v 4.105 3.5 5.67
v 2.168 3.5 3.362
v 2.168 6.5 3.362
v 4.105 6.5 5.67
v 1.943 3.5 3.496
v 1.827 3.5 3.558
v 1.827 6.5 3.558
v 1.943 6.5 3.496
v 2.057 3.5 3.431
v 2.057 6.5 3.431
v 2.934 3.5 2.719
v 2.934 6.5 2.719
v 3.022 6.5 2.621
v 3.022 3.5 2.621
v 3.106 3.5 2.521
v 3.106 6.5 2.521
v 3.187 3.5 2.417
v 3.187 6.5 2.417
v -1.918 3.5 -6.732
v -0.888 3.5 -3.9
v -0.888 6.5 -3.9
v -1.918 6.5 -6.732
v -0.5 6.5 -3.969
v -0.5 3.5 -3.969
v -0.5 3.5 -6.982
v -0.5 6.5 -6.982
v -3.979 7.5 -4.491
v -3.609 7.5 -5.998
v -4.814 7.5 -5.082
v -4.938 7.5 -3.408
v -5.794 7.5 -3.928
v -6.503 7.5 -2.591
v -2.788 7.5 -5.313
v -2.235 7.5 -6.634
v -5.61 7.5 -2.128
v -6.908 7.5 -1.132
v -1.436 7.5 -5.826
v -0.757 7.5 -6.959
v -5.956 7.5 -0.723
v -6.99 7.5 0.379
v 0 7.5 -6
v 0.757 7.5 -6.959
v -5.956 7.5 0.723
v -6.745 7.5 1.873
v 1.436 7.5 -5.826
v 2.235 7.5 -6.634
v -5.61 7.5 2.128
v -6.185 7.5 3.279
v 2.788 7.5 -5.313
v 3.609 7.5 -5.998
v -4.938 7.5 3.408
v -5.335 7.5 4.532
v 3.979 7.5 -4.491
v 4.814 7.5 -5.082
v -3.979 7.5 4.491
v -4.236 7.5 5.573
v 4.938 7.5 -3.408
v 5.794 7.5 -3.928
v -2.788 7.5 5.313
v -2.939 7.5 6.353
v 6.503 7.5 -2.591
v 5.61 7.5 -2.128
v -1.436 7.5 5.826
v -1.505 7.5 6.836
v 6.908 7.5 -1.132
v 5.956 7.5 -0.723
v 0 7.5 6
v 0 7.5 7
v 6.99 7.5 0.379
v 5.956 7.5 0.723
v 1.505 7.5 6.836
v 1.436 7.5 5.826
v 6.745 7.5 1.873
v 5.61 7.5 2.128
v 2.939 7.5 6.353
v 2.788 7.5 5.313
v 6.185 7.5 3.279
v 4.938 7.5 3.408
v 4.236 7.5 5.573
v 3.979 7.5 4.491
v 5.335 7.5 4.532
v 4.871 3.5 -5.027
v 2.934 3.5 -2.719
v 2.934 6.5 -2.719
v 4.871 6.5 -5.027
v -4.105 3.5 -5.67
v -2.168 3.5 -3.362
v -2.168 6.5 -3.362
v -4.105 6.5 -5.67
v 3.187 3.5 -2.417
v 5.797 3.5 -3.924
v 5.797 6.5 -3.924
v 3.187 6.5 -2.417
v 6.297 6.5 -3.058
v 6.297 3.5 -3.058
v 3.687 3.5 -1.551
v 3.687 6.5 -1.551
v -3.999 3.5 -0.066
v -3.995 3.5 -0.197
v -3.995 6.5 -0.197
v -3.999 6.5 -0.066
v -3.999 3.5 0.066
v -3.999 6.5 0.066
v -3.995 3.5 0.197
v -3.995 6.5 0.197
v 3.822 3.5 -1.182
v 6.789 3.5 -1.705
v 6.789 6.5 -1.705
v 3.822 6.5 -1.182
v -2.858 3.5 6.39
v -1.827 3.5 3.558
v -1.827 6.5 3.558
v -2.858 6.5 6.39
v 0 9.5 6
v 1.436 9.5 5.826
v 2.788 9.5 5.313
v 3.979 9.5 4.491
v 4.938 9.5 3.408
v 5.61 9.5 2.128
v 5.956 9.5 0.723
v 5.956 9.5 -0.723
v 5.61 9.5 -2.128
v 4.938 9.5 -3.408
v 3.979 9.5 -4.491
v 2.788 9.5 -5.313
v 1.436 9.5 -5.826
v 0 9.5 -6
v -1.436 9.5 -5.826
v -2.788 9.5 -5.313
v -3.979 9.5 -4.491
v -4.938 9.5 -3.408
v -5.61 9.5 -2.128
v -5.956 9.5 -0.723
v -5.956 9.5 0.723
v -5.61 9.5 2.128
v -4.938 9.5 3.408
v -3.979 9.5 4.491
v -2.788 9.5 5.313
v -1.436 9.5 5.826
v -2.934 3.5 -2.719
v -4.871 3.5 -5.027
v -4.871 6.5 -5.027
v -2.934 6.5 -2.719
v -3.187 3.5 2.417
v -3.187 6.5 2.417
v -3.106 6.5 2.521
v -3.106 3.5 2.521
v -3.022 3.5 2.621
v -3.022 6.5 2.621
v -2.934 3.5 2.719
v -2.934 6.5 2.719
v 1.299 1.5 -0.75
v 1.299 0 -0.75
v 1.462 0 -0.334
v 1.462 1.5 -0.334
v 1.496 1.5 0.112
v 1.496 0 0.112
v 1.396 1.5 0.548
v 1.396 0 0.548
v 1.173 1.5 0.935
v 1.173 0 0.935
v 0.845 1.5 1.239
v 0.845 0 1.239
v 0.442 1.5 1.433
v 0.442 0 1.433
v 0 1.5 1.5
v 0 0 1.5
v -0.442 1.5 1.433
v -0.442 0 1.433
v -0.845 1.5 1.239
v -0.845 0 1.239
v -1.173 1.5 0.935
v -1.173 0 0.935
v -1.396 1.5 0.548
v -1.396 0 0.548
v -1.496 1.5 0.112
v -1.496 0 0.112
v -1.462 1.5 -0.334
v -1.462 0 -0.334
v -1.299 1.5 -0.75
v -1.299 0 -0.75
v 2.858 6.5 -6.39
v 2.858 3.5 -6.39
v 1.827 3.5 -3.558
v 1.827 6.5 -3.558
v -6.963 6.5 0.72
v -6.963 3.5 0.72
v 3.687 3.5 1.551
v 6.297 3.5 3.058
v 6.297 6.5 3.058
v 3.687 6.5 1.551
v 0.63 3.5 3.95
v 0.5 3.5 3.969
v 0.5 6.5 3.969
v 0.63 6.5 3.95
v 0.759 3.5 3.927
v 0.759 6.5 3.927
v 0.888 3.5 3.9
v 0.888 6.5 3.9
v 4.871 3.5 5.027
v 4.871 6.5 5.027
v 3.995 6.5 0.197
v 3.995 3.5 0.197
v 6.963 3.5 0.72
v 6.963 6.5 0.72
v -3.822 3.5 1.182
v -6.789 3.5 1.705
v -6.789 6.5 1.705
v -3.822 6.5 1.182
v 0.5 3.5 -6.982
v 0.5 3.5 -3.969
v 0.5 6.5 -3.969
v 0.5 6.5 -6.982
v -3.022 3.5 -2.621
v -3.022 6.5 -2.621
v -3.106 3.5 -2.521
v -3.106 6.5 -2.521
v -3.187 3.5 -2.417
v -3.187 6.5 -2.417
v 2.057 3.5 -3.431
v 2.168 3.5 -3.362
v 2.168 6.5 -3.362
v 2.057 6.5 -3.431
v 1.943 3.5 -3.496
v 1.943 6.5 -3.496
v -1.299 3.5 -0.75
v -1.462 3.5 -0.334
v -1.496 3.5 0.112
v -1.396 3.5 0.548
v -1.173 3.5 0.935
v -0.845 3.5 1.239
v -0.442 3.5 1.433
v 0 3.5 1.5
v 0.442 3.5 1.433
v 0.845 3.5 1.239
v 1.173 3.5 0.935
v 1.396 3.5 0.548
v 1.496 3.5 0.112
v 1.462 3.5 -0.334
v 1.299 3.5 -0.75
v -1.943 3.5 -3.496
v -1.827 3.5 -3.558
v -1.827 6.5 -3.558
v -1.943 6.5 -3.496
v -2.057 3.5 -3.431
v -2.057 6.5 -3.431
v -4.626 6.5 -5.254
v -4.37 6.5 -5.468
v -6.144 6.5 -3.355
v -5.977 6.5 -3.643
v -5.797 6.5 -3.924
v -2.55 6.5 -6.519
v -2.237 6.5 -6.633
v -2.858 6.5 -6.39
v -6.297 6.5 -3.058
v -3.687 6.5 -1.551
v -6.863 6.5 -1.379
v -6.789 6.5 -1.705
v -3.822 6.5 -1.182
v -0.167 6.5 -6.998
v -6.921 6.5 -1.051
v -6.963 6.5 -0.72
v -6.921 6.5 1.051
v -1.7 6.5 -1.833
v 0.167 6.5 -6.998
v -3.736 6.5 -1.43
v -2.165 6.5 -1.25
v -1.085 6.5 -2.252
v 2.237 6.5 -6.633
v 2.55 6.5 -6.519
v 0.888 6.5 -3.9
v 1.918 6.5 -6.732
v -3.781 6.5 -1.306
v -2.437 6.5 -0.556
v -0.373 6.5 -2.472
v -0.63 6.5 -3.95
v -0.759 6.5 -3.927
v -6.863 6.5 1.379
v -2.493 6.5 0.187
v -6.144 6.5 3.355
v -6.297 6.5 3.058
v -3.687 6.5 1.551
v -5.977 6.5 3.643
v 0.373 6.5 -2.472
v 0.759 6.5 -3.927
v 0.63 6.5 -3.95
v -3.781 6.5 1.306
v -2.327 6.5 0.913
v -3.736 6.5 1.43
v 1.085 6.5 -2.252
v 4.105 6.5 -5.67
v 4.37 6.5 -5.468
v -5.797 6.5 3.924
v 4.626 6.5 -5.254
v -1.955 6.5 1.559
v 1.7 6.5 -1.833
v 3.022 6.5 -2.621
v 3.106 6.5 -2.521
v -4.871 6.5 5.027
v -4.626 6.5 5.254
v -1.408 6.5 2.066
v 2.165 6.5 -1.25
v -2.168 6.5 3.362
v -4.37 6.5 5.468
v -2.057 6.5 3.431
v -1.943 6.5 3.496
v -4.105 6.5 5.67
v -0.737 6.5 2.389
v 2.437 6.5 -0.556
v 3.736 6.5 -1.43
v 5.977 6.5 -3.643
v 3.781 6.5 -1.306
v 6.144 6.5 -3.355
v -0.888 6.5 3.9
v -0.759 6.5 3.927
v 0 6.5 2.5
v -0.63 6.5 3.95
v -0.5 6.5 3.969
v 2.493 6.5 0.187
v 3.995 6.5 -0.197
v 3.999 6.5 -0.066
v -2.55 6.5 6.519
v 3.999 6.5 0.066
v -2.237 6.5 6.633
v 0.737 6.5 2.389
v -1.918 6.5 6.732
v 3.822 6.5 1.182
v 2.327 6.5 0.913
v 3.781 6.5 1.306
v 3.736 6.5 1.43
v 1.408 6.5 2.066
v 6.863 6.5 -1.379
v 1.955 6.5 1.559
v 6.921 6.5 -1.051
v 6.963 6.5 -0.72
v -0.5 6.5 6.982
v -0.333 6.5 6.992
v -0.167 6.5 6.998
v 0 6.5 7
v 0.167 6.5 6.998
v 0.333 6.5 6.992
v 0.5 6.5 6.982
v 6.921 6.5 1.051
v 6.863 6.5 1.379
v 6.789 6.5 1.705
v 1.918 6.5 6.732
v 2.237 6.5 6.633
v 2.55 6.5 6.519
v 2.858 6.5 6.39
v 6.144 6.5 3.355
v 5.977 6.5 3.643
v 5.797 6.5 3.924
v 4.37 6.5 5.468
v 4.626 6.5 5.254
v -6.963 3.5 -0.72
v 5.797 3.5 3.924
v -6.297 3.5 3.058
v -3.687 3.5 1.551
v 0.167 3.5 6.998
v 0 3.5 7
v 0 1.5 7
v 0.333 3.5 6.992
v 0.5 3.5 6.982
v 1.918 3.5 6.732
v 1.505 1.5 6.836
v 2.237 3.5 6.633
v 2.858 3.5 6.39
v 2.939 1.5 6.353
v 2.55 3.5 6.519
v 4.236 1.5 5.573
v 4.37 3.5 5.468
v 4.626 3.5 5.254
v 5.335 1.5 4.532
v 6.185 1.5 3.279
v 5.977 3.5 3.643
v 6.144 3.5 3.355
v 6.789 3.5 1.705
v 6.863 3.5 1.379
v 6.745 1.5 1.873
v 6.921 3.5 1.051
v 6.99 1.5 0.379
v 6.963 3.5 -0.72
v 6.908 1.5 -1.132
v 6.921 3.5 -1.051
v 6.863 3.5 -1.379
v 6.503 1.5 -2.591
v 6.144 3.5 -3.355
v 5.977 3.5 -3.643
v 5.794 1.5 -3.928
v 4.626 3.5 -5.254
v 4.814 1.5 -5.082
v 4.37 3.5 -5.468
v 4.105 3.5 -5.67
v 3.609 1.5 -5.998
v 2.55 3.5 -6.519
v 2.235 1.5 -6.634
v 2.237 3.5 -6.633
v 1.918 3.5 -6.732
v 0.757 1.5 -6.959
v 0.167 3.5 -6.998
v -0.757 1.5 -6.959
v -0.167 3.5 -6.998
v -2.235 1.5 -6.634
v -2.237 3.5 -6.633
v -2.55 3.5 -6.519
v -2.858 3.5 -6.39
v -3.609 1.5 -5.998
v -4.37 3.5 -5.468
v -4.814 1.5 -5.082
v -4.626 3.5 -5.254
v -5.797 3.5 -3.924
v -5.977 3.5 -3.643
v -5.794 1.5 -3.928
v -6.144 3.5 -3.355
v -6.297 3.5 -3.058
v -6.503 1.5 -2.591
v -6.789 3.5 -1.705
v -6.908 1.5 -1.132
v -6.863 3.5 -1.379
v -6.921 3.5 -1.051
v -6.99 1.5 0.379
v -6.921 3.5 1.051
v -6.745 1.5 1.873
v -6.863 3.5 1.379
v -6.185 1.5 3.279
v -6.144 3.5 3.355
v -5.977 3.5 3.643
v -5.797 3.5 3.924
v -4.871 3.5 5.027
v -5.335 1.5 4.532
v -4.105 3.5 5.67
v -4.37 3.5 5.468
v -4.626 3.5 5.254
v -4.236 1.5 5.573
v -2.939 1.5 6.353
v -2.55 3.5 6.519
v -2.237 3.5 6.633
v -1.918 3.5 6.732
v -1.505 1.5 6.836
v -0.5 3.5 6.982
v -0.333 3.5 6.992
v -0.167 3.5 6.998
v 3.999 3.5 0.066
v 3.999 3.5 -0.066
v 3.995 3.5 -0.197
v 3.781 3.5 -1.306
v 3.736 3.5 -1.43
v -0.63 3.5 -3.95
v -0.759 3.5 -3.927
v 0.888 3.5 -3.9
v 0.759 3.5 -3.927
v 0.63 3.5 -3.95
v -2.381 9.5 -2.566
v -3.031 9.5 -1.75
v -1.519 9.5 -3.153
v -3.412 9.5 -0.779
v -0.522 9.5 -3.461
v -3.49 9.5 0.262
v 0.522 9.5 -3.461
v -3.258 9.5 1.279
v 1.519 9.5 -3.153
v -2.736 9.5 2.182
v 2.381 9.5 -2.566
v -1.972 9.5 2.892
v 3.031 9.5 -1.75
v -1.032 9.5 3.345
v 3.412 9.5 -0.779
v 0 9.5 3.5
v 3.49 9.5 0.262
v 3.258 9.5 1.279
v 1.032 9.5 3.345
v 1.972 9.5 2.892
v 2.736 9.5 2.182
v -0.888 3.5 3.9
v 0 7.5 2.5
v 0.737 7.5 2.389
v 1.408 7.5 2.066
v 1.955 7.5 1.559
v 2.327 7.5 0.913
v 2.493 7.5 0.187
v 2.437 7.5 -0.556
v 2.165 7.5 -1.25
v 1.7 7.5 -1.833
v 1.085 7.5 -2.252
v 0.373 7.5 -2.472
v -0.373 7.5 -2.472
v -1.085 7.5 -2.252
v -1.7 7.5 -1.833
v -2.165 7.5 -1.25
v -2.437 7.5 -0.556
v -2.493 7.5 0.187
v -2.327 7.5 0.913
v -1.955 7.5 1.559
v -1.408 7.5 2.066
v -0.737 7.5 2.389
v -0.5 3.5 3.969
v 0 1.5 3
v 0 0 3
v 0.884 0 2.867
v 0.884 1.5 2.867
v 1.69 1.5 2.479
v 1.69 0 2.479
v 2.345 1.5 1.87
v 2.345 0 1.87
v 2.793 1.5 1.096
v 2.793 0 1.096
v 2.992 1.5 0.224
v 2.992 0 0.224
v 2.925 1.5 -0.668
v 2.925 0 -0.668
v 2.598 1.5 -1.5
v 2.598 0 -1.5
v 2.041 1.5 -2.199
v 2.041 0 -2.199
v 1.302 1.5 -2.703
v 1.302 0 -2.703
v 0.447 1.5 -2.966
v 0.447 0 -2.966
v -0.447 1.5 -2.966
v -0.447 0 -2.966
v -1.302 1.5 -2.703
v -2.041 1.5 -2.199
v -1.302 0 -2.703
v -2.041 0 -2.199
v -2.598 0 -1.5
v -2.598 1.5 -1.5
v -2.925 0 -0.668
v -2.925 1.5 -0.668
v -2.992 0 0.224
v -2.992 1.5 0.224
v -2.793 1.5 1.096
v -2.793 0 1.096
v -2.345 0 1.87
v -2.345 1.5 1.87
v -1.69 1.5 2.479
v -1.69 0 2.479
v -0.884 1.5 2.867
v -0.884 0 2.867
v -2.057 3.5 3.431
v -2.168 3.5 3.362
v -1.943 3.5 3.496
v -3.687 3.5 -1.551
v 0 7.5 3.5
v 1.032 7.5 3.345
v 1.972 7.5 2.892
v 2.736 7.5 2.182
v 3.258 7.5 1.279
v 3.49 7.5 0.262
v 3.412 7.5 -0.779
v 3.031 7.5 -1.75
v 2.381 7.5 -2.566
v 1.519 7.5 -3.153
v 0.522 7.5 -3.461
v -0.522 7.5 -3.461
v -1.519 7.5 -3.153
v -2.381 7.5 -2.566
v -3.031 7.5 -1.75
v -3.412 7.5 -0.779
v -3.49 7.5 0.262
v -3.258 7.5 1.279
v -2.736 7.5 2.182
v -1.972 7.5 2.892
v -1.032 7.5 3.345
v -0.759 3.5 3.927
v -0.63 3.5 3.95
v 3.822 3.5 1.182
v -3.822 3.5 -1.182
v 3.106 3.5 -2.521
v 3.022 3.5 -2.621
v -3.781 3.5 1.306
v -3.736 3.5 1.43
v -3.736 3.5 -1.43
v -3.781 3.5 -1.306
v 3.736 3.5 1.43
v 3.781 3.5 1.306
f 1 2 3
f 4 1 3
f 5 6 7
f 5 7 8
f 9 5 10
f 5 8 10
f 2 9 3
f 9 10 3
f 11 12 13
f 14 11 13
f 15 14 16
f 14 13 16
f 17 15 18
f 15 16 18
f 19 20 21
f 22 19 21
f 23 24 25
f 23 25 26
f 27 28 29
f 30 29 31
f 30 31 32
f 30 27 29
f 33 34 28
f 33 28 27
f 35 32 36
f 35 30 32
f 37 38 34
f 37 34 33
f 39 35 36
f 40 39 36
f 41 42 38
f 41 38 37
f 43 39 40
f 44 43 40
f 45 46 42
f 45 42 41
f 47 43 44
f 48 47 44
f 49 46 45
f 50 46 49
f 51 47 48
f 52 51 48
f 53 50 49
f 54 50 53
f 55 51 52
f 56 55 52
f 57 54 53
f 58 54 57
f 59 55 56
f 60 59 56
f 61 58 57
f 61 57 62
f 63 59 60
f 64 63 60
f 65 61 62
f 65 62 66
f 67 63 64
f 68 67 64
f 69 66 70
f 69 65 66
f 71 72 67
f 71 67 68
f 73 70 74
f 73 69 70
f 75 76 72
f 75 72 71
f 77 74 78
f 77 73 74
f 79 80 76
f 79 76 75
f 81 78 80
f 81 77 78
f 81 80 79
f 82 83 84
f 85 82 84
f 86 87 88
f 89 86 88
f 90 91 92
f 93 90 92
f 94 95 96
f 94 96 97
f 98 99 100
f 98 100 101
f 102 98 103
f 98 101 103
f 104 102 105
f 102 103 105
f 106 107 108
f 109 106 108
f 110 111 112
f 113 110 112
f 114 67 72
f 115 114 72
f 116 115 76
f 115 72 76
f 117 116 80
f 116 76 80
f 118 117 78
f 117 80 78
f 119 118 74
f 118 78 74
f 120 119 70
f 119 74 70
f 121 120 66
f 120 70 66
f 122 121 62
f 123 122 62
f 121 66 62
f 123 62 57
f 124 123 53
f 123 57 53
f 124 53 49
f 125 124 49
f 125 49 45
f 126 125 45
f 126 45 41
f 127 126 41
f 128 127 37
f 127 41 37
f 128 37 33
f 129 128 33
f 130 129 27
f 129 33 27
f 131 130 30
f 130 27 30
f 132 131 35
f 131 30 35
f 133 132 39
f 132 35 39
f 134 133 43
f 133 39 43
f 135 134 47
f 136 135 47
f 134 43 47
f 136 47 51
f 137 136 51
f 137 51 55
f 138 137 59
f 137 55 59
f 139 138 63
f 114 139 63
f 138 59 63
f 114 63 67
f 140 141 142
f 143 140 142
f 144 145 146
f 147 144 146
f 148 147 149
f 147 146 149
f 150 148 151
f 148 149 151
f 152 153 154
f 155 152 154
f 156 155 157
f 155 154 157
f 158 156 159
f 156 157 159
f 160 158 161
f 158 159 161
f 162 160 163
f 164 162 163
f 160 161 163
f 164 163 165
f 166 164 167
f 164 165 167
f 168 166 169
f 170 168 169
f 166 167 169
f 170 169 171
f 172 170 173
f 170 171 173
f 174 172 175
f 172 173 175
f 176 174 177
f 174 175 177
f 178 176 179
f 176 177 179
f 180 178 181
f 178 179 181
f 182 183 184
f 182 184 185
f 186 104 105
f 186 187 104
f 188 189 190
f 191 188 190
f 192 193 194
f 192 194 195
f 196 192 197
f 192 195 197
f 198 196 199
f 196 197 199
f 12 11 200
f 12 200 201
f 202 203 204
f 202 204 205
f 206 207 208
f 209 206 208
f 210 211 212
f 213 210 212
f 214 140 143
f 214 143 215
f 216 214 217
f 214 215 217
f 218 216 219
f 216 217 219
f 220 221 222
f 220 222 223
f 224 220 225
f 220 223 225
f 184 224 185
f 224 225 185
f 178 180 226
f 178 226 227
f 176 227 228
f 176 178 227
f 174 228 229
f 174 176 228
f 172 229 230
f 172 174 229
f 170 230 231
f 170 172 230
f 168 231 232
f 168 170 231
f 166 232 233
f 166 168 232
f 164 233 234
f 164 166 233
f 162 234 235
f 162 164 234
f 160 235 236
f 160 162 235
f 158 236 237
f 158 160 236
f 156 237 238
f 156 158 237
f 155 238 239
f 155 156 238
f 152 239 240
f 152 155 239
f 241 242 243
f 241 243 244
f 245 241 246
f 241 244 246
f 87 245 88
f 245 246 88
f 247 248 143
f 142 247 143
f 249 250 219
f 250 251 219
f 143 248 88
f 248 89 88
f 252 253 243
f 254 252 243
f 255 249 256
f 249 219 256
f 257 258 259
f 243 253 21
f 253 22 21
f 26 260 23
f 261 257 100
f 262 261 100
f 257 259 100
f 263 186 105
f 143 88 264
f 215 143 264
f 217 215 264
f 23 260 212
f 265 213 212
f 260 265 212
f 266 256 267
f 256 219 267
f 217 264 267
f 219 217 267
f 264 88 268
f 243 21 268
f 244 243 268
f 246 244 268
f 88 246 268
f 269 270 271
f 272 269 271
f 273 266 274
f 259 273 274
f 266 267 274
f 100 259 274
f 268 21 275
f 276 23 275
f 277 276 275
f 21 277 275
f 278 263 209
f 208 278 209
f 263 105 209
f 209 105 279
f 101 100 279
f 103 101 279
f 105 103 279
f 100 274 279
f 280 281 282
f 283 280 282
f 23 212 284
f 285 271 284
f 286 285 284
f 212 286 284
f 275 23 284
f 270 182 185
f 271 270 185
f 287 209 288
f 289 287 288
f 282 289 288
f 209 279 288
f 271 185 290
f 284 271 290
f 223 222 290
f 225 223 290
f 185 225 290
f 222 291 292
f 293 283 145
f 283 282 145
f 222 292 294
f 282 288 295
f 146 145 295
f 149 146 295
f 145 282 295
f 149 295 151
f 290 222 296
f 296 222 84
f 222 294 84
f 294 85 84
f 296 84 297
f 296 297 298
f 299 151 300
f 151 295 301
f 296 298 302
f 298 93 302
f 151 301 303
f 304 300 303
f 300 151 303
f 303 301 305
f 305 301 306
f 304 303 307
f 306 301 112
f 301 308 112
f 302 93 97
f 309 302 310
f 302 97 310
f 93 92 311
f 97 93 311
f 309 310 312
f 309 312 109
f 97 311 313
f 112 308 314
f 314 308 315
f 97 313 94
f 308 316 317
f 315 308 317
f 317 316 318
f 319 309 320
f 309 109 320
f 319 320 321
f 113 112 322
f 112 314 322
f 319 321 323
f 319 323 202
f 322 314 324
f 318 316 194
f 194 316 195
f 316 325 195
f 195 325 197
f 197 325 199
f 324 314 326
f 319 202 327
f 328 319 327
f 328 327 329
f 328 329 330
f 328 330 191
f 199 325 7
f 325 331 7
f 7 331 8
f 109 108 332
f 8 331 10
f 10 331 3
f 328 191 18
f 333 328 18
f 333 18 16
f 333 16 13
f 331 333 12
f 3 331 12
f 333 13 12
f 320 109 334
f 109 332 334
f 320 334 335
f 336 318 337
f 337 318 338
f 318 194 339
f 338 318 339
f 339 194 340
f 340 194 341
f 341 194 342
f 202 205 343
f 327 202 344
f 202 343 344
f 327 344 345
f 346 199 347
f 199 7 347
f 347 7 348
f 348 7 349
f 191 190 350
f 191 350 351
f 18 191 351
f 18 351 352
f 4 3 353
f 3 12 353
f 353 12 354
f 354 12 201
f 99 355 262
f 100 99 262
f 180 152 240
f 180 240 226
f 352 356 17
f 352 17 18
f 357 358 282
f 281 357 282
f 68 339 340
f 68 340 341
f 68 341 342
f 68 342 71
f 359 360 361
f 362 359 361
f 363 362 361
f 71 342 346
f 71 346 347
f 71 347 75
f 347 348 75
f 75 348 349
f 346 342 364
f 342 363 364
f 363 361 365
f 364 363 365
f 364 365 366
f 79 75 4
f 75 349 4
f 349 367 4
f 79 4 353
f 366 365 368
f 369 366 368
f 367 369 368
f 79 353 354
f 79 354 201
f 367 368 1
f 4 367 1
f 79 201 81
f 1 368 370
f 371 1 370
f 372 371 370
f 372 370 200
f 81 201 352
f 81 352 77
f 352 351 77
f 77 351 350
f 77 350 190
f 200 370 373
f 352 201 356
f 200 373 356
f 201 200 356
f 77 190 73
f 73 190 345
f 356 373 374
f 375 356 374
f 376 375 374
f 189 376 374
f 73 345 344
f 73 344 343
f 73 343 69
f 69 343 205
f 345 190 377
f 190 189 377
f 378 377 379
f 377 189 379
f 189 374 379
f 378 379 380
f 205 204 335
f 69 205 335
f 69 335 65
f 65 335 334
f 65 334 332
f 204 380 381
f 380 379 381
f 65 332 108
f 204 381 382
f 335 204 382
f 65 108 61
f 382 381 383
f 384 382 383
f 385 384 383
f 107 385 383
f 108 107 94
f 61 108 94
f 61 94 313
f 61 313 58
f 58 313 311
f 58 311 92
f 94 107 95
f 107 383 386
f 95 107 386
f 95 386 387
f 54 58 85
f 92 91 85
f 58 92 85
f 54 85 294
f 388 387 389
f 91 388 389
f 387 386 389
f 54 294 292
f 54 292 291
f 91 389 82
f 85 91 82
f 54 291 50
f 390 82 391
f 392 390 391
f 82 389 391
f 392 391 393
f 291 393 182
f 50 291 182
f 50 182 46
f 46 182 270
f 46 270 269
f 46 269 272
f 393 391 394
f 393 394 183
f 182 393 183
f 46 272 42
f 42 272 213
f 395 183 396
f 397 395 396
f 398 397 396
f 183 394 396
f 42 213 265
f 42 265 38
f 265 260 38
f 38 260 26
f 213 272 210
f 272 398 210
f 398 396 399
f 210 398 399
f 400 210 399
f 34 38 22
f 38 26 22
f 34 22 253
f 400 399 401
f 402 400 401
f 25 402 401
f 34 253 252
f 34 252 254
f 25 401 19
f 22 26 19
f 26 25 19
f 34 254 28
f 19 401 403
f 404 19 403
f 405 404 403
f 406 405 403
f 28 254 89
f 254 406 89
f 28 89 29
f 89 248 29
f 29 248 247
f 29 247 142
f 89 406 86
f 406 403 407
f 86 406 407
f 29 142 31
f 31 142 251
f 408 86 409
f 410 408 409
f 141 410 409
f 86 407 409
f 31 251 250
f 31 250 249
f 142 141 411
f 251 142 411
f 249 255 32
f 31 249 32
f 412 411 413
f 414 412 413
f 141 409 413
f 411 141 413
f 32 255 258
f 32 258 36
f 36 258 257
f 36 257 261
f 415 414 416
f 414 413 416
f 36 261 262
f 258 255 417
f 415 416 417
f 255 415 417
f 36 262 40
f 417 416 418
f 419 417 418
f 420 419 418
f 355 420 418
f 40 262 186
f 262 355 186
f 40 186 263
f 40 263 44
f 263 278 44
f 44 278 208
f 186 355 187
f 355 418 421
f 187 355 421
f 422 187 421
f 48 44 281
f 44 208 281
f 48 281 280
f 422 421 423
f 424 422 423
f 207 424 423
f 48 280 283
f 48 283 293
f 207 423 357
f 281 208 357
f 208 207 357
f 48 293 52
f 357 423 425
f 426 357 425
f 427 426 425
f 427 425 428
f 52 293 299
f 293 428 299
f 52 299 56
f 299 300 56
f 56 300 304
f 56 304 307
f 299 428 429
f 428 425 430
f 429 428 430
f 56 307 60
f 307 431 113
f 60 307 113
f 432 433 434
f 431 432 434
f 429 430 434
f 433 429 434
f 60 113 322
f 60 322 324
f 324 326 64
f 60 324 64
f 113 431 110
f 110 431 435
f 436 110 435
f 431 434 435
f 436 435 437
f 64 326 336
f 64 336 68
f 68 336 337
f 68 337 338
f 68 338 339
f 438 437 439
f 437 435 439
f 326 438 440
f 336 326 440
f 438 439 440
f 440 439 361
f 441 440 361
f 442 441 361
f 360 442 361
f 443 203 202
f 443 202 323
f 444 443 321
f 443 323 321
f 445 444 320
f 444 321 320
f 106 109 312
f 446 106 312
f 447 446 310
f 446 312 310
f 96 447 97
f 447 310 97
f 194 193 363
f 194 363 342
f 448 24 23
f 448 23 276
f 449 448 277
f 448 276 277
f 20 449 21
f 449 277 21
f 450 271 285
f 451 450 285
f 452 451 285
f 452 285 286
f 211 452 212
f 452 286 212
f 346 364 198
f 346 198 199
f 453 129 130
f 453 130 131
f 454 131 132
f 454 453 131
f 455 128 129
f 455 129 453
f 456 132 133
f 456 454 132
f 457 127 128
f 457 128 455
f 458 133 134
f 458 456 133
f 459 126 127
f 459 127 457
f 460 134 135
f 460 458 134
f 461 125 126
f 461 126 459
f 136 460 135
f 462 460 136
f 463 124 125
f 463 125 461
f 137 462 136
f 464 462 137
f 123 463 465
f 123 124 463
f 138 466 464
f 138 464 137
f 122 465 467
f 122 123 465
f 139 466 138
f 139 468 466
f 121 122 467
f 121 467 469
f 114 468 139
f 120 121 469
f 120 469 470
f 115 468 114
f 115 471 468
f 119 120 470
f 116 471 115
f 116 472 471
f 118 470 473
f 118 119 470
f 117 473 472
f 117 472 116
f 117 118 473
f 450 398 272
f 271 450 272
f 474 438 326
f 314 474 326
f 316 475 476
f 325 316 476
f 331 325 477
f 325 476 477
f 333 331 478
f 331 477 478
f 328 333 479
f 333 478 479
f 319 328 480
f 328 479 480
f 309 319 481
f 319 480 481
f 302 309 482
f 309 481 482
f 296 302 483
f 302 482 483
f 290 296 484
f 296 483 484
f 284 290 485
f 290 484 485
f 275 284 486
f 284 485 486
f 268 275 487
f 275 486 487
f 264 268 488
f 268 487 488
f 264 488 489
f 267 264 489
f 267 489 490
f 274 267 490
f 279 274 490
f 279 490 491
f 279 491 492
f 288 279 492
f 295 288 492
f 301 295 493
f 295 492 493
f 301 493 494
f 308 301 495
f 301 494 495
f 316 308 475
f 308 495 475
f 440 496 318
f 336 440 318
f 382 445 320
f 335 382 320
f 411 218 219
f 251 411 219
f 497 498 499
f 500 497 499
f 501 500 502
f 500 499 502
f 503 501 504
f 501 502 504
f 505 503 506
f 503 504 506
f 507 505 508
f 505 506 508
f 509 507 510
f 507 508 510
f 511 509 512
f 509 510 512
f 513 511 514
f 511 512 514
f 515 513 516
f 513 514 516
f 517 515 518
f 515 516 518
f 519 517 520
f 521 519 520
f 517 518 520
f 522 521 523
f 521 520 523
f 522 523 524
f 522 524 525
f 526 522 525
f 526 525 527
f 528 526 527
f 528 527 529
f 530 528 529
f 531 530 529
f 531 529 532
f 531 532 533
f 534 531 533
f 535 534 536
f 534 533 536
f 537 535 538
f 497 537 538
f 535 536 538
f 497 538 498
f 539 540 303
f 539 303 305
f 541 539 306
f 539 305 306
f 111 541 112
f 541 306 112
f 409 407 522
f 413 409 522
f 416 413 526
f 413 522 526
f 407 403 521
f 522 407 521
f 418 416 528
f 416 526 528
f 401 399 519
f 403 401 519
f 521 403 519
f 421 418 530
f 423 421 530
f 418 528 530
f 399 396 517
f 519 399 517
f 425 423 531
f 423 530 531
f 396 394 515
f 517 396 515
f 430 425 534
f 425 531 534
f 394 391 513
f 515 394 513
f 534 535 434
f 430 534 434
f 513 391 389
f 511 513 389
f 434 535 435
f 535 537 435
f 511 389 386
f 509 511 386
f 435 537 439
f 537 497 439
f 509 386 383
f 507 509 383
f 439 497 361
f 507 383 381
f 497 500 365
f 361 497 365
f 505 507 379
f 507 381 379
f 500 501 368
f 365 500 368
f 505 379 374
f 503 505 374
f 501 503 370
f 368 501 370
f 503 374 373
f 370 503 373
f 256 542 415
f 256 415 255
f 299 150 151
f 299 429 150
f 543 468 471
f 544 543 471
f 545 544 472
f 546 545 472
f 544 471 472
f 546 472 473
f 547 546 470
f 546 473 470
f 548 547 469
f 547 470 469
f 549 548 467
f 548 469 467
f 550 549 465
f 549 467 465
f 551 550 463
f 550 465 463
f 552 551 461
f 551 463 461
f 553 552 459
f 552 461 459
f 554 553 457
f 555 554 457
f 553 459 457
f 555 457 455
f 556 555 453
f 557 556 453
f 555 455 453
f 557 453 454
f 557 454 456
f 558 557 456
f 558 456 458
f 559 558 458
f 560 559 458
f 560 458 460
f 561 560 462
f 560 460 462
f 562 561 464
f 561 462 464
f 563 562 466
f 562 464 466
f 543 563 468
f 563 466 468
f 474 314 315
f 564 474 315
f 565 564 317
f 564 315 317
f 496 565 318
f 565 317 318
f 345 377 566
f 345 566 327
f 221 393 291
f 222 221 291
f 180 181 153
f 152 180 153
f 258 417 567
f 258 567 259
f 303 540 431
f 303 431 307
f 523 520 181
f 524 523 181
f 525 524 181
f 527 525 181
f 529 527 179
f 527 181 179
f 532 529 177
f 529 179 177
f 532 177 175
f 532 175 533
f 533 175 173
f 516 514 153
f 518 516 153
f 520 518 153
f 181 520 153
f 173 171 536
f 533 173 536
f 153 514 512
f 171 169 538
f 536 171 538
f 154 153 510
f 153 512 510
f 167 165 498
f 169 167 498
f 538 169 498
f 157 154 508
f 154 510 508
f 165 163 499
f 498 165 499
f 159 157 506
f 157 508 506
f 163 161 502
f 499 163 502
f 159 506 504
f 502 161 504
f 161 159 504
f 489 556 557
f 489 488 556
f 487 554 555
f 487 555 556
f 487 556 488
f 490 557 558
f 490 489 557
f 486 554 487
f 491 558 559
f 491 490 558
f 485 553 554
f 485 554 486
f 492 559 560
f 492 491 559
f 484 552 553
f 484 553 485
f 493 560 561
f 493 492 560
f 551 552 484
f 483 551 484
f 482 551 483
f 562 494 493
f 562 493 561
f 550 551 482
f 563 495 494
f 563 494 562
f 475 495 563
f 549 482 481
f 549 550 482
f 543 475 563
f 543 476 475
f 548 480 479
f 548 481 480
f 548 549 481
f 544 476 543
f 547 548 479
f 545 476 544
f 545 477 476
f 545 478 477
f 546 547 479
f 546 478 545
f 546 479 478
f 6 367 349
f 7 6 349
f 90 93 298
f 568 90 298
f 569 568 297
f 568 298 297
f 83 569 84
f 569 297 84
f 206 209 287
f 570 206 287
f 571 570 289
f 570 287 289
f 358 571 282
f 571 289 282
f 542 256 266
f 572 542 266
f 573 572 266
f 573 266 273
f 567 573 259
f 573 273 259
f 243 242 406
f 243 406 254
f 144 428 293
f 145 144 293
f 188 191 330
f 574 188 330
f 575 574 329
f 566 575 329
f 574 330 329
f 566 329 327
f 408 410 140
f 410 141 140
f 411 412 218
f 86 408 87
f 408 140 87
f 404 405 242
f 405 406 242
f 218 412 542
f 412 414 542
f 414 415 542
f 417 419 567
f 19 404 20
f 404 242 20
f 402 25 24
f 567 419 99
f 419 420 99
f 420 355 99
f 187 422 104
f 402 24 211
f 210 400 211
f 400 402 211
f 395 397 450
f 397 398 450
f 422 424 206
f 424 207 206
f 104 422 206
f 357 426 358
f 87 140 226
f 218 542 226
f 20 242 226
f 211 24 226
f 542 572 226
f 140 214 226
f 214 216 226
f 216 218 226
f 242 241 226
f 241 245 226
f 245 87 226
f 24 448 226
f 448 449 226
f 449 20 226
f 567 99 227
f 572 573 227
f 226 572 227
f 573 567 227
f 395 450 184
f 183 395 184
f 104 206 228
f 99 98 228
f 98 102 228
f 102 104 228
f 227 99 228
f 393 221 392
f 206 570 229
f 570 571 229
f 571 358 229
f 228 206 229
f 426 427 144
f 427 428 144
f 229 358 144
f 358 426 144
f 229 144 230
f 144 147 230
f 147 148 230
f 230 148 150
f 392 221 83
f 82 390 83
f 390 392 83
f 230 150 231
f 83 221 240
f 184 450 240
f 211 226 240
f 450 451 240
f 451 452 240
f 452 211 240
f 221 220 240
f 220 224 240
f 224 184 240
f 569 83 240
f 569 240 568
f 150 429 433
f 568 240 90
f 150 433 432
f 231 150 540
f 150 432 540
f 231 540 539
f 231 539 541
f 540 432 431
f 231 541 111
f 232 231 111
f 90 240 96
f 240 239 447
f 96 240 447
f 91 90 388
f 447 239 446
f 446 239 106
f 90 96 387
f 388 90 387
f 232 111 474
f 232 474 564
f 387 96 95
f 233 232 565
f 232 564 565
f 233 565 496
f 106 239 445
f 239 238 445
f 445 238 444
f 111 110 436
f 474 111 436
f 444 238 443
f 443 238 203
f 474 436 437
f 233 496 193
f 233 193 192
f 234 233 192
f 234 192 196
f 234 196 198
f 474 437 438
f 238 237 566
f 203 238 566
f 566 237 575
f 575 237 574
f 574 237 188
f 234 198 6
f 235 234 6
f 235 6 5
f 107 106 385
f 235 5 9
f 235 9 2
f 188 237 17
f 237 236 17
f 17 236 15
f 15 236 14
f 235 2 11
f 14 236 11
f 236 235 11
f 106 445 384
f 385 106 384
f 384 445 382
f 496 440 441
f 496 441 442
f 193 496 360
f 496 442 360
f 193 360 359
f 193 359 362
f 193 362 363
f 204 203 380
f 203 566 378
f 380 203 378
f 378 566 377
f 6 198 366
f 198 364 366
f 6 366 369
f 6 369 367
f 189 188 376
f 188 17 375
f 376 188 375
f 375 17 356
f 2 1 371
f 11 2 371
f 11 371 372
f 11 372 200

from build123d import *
from build123d.topology import SkipClean

# Parameters (mm, degrees)
SKETCH_1_R               = 3
EXTRUDE_1_DEPTH          = 1.5
SKETCH_2_R               = 7
EXTRUDE_2_DEPTH          = 2
SKETCH_3_R               = 7
EXTRUDE_3_DEPTH          = 3
SKETCH_4_W               = 1
SKETCH_4_H               = 3
CUT_EXTRUDE_1_DEPTH      = 12.842719282
PATTERN_CIRCULAR_1_COUNT = 9
SKETCH_8_R               = 4
CUT_EXTRUDE_3_DEPTH      = 3
SKETCH_5_R               = 7
EXTRUDE_4_DEPTH          = 1
SKETCH_6_R               = 6
EXTRUDE_5_DEPTH          = 2
SKETCH_7_R               = 3.5
CUT_EXTRUDE_2_DEPTH      = 2
SKETCH_9_R               = 2.5
CUT_EXTRUDE_4_DEPTH      = 1


with BuildPart() as part:
    # 草图1 → 凸台-拉伸1 (new body)
    with BuildSketch(Plane(origin=(0, 0, 0), x_dir=(1, 0, 0), z_dir=(0, 1, 0))):
        with Locations(Location((0, 0, 0), (0, 0, 270))):
            Circle(SKETCH_1_R)
        with BuildLine():
            Line((-1.299038106, 0.75), (1.299038106, 0.75))
            ThreePointArc((1.299038106, 0.75), (0, -1.5), (-1.299038106, 0.75))
        make_face(mode=Mode.SUBTRACT)
    extrude(amount=EXTRUDE_1_DEPTH)

    # 草图2 → 凸台-拉伸2 (add)
    with SkipClean():  # the faces are left unmerged after this step: merging them gives an invalid solid
        with BuildSketch(Plane(origin=(0, 1.5, 0), x_dir=(1, 0, 0), z_dir=(0, 1, 0))):
            with Locations(Location((0, 0, 0), (0, 0, 270))):
                Circle(SKETCH_2_R)
            with BuildLine():
                Line((1.299038106, 0.75), (-1.299038106, 0.75))
                ThreePointArc((-1.299038106, 0.75), (0, -1.5), (1.299038106, 0.75))
            make_face(mode=Mode.SUBTRACT)
        extrude(amount=EXTRUDE_2_DEPTH)

    # 草图3 → 凸台-拉伸3 (add)
    with SkipClean():  # the faces are left unmerged after this step: merging them gives an invalid solid
        with BuildSketch(Plane(origin=(0, 3.5, 0), x_dir=(1, 0, 0), z_dir=(0, 1, 0))):
            with Locations(Location((0, 0, 0), (0, 0, 270))):
                Circle(SKETCH_3_R)
        extrude(amount=EXTRUDE_3_DEPTH)

    # 草图4 → 切除-拉伸1 (cut, symmetric)
    with SkipClean():  # the faces are left unmerged after this step: merging them gives an invalid solid
        with BuildSketch(Plane.XY):
            with Locations((0, 5)):
                Rectangle(SKETCH_4_W, SKETCH_4_H)
        cut_extrude_1 = extrude(amount=CUT_EXTRUDE_1_DEPTH, both=True, mode=Mode.SUBTRACT)

    # 阵列(圆周)1: 切除-拉伸1 ×9 about axis
    with SkipClean():  # the faces are left unmerged after this step: merging them gives an invalid solid
        pattern_circular_1_axis = Axis((0, 0, 0), (0, 1, 0))
        for i in range(1, PATTERN_CIRCULAR_1_COUNT):
            add(cut_extrude_1.rotate(pattern_circular_1_axis, i * 360 / PATTERN_CIRCULAR_1_COUNT), mode=Mode.SUBTRACT)

    # 草图8 → 切除-拉伸3 (cut)
    with SkipClean():  # the faces are left unmerged after this step: merging them gives an invalid solid
        with BuildSketch(Plane(origin=(0, 6.5, 0), x_dir=(1, 0, 0), z_dir=(0, 1, 0))):
            Circle(SKETCH_8_R)
        extrude(amount=-CUT_EXTRUDE_3_DEPTH, mode=Mode.SUBTRACT)

    # 草图5 → 凸台-拉伸4 (add)
    with BuildSketch(Plane(origin=(0, 6.5, 0), x_dir=(1, 0, 0), z_dir=(0, 1, 0))):
        with Locations(Location((0, 0, 0), (0, 0, 270))):
            Circle(SKETCH_5_R)
    extrude(amount=EXTRUDE_4_DEPTH)

    # 草图6 → 凸台-拉伸5 (add)
    with BuildSketch(Plane(origin=(0, 7.5, 0), x_dir=(1, 0, 0), z_dir=(0, 1, 0))):
        with Locations(Location((0, 0, 0), (0, 0, 270))):
            Circle(SKETCH_6_R)
    extrude(amount=EXTRUDE_5_DEPTH)

    # 草图7 → 切除-拉伸2 (cut)
    with BuildSketch(Plane(origin=(0, 9.5, 0), x_dir=(1, 0, 0), z_dir=(0, 1, 0))):
        with Locations(Location((0, 0, 0), (0, 0, 270))):
            Circle(SKETCH_7_R)
    extrude(amount=-CUT_EXTRUDE_2_DEPTH, mode=Mode.SUBTRACT)

    # 草图9 → 切除-拉伸4 (cut)
    with BuildSketch(Plane(origin=(0, 7.5, 0), x_dir=(1, 0, 0), z_dir=(0, 1, 0))):
        with Locations(Location((0, 0, 0), (0, 0, 270))):
            Circle(SKETCH_9_R)
    extrude(amount=-CUT_EXTRUDE_4_DEPTH, mode=Mode.SUBTRACT)


solid = part.part
